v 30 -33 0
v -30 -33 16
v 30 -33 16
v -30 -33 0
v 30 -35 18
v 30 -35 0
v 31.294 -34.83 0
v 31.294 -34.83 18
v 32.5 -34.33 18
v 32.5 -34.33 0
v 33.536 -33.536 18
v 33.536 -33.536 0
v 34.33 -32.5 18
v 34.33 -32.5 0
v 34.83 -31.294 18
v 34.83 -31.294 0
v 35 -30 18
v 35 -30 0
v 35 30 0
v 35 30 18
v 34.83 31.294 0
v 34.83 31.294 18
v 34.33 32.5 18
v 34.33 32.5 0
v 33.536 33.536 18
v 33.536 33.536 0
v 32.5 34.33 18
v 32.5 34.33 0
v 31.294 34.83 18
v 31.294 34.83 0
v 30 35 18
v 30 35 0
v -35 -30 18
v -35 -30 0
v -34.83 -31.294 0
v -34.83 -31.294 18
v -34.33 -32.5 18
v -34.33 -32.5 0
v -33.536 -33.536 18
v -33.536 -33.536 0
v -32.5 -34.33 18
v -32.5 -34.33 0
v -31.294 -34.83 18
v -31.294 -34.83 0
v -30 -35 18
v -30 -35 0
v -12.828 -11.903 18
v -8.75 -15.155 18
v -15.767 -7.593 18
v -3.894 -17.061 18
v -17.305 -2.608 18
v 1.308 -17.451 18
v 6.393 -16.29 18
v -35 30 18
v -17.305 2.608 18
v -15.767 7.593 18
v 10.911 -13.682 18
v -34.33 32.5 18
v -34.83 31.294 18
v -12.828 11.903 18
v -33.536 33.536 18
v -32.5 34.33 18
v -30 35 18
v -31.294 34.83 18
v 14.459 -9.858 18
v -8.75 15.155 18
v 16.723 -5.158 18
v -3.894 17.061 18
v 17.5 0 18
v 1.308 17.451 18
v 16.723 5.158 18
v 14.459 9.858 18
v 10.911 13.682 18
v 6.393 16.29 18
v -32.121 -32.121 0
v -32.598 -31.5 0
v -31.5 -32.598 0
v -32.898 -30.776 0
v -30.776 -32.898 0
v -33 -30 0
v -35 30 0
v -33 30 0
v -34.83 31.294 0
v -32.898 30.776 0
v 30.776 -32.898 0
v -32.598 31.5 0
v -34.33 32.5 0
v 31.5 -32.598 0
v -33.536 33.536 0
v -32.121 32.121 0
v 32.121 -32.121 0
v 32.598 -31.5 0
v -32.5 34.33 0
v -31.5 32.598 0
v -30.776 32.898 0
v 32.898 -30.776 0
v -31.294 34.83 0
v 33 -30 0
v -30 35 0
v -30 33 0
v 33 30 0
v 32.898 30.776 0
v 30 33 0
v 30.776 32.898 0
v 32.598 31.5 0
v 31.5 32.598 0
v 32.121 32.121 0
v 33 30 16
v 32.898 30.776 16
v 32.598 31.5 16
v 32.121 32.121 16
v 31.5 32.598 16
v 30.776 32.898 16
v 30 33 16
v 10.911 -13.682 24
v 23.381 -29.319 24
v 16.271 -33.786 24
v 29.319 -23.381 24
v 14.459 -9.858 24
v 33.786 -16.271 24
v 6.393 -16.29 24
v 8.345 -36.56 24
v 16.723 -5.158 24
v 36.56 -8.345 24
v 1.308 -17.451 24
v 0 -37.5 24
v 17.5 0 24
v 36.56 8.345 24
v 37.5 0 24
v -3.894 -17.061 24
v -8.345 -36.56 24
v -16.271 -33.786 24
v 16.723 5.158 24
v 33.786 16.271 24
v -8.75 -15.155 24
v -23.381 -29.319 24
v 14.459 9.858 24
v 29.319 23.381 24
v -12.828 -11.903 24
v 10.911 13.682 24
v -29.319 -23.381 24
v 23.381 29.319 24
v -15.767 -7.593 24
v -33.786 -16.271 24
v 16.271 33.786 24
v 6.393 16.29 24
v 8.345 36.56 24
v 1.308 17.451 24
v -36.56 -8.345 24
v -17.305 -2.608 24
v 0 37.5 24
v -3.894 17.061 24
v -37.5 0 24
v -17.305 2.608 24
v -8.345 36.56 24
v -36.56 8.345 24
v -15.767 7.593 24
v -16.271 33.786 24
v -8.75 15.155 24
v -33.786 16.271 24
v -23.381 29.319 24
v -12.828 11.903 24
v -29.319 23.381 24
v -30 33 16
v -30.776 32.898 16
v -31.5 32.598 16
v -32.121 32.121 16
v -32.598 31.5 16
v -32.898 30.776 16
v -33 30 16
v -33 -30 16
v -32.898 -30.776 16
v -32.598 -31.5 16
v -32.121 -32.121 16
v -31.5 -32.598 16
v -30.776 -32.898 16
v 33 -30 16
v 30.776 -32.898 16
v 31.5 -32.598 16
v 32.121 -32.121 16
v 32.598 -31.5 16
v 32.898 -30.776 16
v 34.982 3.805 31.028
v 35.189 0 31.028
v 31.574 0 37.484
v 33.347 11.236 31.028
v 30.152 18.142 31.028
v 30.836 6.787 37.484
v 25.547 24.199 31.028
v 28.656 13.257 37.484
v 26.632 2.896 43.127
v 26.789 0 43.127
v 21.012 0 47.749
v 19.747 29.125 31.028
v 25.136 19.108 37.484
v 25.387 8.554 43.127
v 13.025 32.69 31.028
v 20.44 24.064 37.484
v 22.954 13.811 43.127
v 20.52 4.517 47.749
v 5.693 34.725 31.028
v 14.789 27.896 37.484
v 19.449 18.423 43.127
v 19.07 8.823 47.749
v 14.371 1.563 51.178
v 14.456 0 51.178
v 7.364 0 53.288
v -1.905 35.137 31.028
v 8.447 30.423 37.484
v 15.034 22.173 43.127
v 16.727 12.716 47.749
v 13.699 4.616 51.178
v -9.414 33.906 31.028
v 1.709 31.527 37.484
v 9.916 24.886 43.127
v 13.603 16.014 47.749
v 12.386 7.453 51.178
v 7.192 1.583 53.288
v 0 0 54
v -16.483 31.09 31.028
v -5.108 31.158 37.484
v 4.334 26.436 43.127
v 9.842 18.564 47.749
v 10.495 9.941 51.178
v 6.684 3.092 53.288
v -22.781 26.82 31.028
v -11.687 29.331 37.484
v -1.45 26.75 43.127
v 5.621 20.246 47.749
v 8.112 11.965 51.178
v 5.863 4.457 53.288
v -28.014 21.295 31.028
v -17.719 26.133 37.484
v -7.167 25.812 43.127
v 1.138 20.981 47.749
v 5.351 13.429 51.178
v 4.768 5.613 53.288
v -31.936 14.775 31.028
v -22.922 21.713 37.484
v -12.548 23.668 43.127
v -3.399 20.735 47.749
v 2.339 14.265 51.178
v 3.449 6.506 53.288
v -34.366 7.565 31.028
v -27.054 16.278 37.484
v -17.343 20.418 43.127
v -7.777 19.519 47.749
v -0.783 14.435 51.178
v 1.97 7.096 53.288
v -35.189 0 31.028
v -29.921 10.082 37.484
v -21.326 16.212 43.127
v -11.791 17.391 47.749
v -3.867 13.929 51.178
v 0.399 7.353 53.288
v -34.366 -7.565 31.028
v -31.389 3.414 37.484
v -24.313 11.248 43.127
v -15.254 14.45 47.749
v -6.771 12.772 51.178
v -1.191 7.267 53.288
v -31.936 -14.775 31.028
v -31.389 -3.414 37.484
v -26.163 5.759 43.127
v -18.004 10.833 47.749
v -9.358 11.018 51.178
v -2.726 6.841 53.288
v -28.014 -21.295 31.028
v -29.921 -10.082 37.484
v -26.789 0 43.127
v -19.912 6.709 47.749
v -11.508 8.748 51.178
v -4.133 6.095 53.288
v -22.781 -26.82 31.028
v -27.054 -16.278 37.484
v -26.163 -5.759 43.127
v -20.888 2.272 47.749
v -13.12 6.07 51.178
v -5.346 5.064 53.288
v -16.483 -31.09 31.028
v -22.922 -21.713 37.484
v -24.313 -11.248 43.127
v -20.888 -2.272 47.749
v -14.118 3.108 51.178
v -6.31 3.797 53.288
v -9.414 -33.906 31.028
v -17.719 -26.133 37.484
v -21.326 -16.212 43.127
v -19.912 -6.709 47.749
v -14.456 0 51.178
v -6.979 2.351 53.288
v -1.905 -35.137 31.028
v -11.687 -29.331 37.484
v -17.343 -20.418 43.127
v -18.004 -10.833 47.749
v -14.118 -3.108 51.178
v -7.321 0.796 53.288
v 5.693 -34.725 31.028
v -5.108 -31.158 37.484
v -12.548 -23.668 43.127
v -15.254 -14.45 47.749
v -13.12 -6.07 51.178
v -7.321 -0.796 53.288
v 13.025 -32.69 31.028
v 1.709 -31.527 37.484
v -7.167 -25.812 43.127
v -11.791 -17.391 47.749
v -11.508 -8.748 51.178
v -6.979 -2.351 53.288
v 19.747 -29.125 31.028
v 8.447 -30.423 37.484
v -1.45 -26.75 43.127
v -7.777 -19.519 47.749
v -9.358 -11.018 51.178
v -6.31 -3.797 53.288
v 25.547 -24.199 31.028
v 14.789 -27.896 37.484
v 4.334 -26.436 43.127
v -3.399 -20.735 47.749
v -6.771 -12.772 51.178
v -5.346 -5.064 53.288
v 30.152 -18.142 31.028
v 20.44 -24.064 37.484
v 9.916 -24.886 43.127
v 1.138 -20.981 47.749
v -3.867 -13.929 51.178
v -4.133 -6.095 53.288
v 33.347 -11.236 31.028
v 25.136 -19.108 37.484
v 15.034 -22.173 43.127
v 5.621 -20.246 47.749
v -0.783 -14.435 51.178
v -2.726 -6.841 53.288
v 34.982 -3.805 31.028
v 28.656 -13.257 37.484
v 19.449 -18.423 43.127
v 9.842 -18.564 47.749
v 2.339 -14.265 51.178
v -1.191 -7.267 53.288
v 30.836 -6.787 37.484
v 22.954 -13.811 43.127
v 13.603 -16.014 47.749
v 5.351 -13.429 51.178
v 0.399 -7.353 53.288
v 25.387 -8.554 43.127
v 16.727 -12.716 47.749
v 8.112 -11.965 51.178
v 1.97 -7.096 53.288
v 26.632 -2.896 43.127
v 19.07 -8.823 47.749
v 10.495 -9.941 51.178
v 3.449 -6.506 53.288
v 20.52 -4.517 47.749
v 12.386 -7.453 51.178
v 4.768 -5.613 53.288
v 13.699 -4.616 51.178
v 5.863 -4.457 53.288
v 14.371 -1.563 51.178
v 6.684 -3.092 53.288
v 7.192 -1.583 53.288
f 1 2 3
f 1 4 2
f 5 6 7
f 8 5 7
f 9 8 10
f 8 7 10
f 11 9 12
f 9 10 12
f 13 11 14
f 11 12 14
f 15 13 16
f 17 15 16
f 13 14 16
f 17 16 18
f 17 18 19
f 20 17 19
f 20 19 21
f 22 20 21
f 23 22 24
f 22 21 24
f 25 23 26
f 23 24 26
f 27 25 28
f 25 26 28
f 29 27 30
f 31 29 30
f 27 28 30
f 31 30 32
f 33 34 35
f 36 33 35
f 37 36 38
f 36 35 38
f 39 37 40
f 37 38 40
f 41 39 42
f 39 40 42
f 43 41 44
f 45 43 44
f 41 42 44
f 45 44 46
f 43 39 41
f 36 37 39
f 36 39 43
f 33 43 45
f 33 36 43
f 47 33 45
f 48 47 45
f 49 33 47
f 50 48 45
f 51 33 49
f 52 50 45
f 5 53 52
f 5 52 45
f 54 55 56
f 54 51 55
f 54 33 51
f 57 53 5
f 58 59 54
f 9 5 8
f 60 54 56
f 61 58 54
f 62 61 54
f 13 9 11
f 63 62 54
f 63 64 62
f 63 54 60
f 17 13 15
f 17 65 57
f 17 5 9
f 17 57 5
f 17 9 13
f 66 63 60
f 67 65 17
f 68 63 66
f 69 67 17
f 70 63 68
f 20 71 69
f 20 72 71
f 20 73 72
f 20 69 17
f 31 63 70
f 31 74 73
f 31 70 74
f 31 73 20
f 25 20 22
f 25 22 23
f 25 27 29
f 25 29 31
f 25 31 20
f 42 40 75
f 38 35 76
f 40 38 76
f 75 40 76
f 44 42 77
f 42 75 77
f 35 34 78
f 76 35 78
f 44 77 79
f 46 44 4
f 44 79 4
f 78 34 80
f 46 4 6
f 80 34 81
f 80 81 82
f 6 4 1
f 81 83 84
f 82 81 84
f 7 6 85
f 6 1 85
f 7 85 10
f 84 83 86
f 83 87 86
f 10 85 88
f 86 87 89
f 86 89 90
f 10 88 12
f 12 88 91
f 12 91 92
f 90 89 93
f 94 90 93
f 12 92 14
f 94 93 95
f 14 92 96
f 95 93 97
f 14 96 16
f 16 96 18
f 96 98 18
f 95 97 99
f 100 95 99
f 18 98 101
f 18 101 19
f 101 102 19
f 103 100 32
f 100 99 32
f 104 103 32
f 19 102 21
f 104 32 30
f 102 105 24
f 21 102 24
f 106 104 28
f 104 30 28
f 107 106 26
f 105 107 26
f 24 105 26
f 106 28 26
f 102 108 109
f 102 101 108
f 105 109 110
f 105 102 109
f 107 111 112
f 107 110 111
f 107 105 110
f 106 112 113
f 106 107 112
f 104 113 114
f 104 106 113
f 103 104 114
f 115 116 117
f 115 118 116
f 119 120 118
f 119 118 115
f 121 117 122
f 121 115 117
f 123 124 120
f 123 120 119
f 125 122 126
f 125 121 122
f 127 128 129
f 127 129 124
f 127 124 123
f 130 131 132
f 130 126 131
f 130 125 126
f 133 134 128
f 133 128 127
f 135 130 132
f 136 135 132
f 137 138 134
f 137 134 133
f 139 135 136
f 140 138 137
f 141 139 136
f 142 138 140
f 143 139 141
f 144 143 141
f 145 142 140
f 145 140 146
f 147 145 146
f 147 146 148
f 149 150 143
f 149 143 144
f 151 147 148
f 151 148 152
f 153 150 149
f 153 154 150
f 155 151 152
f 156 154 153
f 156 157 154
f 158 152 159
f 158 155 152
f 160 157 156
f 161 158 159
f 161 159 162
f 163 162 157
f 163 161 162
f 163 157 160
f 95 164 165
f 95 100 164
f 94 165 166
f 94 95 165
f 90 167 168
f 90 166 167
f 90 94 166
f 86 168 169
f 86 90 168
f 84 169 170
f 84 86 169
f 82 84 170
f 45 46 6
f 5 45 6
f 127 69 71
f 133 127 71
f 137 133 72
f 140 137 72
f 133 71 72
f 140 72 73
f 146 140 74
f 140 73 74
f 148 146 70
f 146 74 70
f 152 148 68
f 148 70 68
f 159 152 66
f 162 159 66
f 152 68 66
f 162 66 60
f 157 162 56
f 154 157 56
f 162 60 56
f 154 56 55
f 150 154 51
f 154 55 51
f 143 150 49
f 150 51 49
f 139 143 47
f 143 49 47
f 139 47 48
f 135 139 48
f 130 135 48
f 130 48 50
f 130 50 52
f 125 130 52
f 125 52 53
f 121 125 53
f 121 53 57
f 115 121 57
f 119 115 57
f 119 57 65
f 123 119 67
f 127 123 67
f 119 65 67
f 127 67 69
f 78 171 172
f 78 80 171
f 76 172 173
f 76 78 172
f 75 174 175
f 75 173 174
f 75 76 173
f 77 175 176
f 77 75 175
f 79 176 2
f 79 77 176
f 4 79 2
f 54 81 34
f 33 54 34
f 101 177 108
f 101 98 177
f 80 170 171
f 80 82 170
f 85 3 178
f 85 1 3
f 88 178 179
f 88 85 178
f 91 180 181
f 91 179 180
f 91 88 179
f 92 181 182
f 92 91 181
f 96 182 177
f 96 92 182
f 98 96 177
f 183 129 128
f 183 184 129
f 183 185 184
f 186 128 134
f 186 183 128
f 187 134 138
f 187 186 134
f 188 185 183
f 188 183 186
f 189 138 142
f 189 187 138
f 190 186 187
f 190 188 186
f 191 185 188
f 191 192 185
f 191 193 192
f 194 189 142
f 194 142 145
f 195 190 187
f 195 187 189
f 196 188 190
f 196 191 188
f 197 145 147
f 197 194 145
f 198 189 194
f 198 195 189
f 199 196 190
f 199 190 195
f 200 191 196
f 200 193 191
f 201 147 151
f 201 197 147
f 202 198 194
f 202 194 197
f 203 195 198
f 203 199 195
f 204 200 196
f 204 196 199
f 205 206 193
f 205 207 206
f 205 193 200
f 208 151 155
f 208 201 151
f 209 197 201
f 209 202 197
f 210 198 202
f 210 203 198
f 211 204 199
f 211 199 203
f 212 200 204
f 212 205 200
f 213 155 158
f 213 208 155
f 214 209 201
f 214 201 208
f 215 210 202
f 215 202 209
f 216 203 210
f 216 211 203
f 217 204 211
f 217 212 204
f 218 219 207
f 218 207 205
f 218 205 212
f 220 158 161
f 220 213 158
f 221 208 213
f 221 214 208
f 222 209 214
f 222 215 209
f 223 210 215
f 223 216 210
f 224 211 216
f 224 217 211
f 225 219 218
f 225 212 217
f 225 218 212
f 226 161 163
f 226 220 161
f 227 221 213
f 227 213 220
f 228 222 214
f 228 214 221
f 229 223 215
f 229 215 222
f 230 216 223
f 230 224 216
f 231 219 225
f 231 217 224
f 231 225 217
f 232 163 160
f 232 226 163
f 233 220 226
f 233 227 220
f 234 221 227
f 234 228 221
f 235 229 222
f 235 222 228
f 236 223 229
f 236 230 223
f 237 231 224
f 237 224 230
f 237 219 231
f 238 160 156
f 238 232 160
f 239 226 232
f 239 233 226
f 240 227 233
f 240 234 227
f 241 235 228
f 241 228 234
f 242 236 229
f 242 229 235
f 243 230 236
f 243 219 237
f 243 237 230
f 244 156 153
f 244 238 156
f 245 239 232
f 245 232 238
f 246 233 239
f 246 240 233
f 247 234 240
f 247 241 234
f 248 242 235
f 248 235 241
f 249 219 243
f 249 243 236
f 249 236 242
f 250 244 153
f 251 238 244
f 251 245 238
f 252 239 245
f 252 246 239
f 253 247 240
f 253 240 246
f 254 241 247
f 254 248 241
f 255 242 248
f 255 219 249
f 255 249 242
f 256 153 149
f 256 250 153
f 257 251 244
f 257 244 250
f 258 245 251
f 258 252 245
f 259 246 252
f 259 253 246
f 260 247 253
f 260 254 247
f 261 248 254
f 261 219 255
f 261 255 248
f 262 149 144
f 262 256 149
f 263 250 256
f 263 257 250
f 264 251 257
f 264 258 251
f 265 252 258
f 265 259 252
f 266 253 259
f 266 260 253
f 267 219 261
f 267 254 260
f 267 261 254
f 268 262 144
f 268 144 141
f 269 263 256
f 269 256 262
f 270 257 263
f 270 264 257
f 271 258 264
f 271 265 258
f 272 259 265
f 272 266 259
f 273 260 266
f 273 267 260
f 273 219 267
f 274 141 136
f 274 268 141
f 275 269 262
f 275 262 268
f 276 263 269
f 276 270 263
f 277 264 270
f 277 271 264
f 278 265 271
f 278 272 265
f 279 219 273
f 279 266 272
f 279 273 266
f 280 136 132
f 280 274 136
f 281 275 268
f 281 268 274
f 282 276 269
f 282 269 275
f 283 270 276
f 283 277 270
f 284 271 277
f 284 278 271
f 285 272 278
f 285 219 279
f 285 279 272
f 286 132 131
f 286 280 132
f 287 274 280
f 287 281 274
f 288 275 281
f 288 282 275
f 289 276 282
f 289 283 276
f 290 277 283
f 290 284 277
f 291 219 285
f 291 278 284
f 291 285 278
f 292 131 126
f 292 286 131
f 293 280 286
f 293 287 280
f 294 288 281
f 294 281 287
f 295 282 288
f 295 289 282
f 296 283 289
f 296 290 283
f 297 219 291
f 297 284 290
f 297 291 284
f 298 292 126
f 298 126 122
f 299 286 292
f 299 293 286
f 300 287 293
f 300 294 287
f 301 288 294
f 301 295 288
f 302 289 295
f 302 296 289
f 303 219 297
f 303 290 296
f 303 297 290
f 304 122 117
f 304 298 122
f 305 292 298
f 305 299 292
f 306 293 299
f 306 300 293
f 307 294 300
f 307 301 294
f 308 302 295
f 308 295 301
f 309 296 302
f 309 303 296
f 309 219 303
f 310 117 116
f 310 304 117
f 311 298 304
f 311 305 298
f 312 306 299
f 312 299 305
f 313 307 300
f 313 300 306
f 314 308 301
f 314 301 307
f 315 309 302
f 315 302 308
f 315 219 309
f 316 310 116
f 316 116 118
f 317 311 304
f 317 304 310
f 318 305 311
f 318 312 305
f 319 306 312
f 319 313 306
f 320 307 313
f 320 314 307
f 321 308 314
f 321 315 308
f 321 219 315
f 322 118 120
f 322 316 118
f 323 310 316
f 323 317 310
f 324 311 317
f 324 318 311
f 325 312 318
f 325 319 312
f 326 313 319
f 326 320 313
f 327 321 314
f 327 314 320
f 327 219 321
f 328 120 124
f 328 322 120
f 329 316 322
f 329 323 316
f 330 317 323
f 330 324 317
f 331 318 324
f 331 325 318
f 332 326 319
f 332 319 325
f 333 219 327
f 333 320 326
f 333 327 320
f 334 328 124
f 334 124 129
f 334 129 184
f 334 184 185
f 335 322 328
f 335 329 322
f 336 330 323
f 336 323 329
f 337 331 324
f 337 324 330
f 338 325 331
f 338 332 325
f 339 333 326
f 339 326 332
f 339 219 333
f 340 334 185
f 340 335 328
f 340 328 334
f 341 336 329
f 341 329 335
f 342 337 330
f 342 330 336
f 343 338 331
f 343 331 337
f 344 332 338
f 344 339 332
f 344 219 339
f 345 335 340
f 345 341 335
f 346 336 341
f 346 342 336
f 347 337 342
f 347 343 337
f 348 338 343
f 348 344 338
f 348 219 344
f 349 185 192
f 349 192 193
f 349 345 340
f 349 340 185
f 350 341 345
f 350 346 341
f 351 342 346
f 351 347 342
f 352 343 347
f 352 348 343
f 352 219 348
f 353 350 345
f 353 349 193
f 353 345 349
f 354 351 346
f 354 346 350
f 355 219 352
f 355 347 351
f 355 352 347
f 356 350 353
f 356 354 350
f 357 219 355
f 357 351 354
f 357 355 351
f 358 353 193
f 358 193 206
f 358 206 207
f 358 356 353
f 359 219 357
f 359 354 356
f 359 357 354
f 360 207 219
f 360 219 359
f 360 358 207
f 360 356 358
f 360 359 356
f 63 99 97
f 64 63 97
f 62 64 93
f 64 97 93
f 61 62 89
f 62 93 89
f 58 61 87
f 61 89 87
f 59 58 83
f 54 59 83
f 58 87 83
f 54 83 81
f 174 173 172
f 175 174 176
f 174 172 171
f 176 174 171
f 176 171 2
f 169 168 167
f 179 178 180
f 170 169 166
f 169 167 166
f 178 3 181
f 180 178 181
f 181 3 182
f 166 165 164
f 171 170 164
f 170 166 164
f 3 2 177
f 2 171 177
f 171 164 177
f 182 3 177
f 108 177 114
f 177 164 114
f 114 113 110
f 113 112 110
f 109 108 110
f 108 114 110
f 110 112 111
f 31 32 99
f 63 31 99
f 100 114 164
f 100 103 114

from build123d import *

# Parameters (mm, degrees)
AUFSATZ_LINEAR_AUSTRAGEN1_DEPTH = 18
WANDUNG1_T                      = -2
SKIZZE2_R                       = 17.5
AUFSATZ_LINEAR_AUSTRAGEN2_DEPTH = 6


with BuildPart() as part:
    # Skizze1 → Aufsatz-Linear austragen1 (new body)
    with BuildSketch(Plane.XY):
        with BuildLine():
            Line((-30, -35), (30, -35))
            ThreePointArc((30, -35), (33.535533906, -33.535533906), (35, -30))
            Line((35, -30), (35, 30))
            ThreePointArc((35, 30), (33.535533906, 33.535533906), (30, 35))
            Line((30, 35), (-30, 35))
            ThreePointArc((-30, 35), (-33.535533906, 33.535533906), (-35, 30))
            Line((-35, 30), (-35, -30))
            ThreePointArc((-35, -30), (-33.535533906, -33.535533906), (-30, -35))
        make_face()
    extrude(amount=AUFSATZ_LINEAR_AUSTRAGEN1_DEPTH)

    # Wandung1
    wandung1_openings = [part.faces().sort_by_distance(p)[0] for p in [
        (0, 0, 0),
    ]]
    offset(amount=WANDUNG1_T, openings=wandung1_openings, kind=Kind.INTERSECTION)

    # Skizze2 → Aufsatz-Linear austragen2 (add)
    with BuildSketch(Plane.XY.offset(18)):
        Circle(SKIZZE2_R)
    extrude(amount=AUFSATZ_LINEAR_AUSTRAGEN2_DEPTH)

    # Skizze3 → Rotation1 (revolve)
    with BuildSketch(Plane(origin=(0, 0, 0), x_dir=(1, 0, 0), z_dir=(0, 1, 0))):
        with BuildLine():
            Line((0, -24), (37.5, -24))
            ThreePointArc((37.5, -24), (24.01171589, -45.577144863), (0, -54))
            Line((0, -54), (0, -24))
        make_face()
    revolve(axis=Axis((0, 0, -8.721924789), (0, 0, 1)))


solid = part.part
